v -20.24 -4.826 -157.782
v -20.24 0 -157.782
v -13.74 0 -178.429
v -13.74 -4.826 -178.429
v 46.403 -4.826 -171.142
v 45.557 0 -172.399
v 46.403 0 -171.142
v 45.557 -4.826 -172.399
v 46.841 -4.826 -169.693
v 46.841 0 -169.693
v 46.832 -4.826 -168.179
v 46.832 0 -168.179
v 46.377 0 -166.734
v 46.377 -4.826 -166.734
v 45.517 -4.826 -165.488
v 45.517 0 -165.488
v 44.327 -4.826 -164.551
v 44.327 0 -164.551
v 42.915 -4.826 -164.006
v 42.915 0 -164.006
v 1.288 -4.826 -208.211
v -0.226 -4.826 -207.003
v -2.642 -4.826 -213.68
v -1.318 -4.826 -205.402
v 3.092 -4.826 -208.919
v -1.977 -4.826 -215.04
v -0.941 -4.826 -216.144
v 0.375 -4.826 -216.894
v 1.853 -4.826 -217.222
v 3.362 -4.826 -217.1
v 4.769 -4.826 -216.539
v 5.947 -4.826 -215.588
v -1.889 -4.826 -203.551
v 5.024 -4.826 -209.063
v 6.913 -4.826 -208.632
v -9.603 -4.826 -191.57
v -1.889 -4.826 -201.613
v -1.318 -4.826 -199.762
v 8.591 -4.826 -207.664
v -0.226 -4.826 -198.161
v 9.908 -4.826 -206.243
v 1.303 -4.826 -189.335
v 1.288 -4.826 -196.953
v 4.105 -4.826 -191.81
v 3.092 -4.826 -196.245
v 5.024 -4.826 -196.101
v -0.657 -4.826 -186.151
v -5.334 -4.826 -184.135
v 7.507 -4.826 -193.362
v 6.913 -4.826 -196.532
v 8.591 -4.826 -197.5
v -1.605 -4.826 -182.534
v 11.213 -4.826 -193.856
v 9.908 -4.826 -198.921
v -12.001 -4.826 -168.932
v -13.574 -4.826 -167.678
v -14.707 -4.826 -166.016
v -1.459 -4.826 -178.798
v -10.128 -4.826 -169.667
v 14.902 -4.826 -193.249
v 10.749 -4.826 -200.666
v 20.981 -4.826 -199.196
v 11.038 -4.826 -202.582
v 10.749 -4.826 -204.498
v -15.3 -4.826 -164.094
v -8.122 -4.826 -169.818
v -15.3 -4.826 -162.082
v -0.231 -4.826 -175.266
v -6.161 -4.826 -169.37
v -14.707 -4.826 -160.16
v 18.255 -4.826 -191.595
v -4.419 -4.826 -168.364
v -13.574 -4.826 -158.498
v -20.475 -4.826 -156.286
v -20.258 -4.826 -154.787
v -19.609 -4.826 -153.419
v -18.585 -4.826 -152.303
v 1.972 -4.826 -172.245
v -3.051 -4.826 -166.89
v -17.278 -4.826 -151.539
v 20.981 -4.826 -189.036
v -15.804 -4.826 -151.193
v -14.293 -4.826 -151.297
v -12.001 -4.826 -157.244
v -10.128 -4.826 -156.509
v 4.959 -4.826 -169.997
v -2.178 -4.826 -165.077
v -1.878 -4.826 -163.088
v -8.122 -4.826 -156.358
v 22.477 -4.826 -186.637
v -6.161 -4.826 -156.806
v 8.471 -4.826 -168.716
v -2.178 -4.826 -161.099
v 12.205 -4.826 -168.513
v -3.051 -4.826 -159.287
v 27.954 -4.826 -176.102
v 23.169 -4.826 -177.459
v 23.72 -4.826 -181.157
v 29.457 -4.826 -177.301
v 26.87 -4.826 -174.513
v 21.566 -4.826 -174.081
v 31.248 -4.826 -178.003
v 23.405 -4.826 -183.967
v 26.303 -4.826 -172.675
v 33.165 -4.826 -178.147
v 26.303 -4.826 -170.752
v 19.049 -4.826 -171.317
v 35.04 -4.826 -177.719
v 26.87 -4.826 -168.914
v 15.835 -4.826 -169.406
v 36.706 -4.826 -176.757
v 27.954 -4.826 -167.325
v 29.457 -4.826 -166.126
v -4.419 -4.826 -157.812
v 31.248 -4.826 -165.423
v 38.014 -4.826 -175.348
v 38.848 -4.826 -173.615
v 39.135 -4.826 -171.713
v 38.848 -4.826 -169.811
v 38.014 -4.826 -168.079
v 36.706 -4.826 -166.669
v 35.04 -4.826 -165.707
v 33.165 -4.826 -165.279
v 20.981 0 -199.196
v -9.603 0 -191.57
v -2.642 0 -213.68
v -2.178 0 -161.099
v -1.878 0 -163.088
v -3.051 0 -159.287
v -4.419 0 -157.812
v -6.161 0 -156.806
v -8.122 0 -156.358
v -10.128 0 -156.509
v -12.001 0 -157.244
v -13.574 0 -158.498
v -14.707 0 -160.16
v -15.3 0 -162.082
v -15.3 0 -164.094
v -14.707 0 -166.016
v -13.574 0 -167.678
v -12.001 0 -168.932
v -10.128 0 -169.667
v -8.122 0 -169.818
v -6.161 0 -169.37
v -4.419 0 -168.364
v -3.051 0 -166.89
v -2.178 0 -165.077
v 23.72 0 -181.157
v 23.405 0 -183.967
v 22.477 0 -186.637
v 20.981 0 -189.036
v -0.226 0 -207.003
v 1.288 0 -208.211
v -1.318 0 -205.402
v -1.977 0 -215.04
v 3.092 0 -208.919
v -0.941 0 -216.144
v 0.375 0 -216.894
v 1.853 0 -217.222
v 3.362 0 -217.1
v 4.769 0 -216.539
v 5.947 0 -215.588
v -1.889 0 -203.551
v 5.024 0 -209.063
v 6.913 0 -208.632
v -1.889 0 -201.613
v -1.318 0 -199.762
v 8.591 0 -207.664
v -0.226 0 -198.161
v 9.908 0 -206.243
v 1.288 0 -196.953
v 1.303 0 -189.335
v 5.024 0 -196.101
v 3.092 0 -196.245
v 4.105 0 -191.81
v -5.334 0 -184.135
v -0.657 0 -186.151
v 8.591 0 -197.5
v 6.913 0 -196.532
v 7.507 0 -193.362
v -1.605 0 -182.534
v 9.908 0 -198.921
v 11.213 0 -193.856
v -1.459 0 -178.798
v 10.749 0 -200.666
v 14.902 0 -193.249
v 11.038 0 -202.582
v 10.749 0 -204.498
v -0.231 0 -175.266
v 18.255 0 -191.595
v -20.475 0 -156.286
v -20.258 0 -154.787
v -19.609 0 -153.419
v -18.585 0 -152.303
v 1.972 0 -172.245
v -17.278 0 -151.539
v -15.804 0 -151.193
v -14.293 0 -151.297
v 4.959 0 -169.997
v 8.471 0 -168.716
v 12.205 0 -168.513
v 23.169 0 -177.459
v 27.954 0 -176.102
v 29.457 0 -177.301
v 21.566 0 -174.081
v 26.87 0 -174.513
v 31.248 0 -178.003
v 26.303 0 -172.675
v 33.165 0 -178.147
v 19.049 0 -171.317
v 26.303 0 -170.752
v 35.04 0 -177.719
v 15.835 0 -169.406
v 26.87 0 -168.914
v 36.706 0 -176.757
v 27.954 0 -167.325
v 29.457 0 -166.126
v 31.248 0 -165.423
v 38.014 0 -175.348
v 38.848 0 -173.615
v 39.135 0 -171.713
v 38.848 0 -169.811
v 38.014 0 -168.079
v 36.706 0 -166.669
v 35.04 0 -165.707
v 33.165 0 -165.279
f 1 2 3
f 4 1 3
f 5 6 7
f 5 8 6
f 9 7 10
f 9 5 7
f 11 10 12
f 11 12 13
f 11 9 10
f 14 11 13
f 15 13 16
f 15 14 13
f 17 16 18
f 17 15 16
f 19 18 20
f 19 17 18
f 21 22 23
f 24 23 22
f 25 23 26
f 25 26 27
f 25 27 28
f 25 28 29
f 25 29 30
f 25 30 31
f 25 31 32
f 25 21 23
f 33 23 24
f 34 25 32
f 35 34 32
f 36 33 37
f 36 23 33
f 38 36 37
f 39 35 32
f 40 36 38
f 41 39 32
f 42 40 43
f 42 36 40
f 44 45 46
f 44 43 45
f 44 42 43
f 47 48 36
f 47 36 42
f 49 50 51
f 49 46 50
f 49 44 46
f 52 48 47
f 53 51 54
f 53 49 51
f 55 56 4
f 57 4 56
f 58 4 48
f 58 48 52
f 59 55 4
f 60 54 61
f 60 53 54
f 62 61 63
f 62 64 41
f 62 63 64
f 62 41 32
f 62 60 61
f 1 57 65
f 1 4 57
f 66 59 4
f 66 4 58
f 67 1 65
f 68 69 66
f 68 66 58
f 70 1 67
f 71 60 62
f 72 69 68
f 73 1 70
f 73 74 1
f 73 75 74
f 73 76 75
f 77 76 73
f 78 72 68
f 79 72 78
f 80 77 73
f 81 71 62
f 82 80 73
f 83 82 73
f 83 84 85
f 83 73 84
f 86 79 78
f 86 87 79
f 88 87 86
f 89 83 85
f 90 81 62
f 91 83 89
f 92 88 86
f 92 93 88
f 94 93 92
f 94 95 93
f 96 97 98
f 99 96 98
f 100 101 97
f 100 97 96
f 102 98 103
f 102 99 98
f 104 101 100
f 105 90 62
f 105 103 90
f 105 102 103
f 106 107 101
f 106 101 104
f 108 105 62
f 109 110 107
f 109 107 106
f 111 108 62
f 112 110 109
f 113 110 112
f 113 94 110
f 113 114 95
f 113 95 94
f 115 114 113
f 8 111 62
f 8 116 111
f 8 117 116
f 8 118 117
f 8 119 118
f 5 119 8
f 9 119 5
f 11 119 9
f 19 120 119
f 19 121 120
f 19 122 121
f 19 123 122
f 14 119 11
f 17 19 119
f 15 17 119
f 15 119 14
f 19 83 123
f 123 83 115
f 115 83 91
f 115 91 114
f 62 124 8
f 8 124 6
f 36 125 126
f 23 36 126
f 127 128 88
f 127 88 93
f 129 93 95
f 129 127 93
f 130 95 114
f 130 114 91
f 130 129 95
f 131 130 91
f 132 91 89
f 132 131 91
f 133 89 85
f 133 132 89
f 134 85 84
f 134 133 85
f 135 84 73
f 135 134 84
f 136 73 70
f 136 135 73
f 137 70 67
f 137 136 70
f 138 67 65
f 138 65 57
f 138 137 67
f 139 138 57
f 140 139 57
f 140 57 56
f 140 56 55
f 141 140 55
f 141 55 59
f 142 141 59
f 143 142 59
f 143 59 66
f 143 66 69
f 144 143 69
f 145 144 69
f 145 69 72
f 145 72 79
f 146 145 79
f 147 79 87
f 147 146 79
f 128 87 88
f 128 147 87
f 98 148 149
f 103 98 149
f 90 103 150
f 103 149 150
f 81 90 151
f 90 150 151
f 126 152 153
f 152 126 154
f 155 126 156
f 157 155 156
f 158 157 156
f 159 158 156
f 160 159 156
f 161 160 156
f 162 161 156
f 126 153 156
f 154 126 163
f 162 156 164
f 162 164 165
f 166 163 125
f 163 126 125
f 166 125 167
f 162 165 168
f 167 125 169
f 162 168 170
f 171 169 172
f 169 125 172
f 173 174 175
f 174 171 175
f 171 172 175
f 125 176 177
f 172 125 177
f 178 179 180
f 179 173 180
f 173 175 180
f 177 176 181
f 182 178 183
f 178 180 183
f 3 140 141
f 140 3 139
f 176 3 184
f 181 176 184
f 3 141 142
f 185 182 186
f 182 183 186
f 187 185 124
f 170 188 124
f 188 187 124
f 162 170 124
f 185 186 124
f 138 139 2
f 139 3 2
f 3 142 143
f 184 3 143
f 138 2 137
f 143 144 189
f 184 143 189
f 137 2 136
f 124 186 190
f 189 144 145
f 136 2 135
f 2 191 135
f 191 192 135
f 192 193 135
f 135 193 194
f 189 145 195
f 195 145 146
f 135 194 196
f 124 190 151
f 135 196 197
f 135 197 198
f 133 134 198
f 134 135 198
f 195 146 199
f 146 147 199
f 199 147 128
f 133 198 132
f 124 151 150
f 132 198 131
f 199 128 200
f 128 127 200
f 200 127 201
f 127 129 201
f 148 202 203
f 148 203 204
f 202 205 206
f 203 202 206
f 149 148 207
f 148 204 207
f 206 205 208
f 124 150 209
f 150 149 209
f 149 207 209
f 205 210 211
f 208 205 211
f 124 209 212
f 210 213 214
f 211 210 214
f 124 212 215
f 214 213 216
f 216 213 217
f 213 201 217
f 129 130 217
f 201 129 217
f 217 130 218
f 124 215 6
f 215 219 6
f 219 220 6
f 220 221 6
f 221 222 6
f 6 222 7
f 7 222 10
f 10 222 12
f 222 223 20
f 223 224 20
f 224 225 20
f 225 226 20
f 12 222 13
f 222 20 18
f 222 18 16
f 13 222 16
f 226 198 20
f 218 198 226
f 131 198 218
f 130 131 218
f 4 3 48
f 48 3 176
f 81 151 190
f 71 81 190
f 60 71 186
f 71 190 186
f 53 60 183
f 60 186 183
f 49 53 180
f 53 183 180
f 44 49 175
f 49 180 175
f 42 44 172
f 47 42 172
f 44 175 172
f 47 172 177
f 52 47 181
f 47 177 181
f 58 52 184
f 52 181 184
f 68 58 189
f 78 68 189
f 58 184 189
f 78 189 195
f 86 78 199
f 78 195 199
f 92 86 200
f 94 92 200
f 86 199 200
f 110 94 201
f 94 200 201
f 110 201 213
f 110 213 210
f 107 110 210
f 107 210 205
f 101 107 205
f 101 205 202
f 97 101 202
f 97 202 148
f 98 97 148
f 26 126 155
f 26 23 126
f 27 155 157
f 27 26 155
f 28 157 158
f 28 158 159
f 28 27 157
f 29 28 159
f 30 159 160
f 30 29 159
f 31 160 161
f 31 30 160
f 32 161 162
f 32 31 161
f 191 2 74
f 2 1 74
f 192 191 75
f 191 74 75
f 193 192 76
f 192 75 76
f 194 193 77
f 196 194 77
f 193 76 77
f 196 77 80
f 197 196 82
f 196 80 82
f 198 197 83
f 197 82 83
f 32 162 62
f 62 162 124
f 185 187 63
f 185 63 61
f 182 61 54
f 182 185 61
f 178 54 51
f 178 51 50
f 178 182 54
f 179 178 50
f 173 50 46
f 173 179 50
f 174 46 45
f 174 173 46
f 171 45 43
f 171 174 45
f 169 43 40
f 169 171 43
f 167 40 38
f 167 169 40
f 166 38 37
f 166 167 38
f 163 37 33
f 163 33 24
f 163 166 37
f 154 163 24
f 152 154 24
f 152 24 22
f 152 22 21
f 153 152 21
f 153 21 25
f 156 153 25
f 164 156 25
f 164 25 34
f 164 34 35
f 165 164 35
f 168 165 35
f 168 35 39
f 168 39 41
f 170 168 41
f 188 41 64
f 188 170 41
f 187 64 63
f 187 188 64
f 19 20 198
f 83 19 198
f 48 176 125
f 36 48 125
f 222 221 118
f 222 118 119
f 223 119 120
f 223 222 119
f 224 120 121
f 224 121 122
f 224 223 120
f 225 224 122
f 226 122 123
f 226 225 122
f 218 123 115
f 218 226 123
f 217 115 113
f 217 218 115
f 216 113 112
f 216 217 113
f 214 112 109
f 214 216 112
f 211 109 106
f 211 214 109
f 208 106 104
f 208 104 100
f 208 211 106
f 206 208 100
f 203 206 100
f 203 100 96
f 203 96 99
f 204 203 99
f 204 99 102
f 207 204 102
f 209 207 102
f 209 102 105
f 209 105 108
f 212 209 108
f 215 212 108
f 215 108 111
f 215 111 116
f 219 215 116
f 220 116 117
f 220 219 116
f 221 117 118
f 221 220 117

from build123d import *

# Parameters (mm, degrees)
F0_R     = 6.499611
F0_R_2   = 6.748497
F0_R_3   = 6.451892
F1_DEPTH = 4.826
F2_R     = 5.08


with BuildPart() as f1:
    # F0 (on Front) → F1 (new body)
    with BuildSketch(Plane.XZ):
        Polygon((-9.602852, -191.570323), (0, -222.072359), (20.980663, -199.195719), (51.504101, -165.913944), (-22.882563, -149.389291), (-13.740194, -178.42867), (-5.334256, -184.135315), align=None)
        with Locations((4.538138, -202.582002)):
            Circle(F0_R, mode=Mode.SUBTRACT)
        with BuildLine():
            ThreePointArc((23.719741, -181.157266), (23.015442, -185.327775), (20.980663, -189.035719))
            ThreePointArc((20.980663, -189.035719), (-0.975961, -176.986757), (23.719741, -181.157266))
        make_face(mode=Mode.SUBTRACT)
        with Locations((-8.626509, -163.088083)):
            Circle(F0_R_2, mode=Mode.SUBTRACT)
        with Locations((32.683235, -171.713188)):
            Circle(F0_R_3, mode=Mode.SUBTRACT)
    extrude(amount=F1_DEPTH)

    # F2
    f2_edges = [f1.edges().sort_by_distance(p)[0] for p in [
        (0, -2.413, -222.072359),
        (51.504101, -2.413, -165.913944),
        (-22.882563, -2.413, -149.389291),
    ]]
    fillet(f2_edges, radius=F2_R)


solid = f1.part
